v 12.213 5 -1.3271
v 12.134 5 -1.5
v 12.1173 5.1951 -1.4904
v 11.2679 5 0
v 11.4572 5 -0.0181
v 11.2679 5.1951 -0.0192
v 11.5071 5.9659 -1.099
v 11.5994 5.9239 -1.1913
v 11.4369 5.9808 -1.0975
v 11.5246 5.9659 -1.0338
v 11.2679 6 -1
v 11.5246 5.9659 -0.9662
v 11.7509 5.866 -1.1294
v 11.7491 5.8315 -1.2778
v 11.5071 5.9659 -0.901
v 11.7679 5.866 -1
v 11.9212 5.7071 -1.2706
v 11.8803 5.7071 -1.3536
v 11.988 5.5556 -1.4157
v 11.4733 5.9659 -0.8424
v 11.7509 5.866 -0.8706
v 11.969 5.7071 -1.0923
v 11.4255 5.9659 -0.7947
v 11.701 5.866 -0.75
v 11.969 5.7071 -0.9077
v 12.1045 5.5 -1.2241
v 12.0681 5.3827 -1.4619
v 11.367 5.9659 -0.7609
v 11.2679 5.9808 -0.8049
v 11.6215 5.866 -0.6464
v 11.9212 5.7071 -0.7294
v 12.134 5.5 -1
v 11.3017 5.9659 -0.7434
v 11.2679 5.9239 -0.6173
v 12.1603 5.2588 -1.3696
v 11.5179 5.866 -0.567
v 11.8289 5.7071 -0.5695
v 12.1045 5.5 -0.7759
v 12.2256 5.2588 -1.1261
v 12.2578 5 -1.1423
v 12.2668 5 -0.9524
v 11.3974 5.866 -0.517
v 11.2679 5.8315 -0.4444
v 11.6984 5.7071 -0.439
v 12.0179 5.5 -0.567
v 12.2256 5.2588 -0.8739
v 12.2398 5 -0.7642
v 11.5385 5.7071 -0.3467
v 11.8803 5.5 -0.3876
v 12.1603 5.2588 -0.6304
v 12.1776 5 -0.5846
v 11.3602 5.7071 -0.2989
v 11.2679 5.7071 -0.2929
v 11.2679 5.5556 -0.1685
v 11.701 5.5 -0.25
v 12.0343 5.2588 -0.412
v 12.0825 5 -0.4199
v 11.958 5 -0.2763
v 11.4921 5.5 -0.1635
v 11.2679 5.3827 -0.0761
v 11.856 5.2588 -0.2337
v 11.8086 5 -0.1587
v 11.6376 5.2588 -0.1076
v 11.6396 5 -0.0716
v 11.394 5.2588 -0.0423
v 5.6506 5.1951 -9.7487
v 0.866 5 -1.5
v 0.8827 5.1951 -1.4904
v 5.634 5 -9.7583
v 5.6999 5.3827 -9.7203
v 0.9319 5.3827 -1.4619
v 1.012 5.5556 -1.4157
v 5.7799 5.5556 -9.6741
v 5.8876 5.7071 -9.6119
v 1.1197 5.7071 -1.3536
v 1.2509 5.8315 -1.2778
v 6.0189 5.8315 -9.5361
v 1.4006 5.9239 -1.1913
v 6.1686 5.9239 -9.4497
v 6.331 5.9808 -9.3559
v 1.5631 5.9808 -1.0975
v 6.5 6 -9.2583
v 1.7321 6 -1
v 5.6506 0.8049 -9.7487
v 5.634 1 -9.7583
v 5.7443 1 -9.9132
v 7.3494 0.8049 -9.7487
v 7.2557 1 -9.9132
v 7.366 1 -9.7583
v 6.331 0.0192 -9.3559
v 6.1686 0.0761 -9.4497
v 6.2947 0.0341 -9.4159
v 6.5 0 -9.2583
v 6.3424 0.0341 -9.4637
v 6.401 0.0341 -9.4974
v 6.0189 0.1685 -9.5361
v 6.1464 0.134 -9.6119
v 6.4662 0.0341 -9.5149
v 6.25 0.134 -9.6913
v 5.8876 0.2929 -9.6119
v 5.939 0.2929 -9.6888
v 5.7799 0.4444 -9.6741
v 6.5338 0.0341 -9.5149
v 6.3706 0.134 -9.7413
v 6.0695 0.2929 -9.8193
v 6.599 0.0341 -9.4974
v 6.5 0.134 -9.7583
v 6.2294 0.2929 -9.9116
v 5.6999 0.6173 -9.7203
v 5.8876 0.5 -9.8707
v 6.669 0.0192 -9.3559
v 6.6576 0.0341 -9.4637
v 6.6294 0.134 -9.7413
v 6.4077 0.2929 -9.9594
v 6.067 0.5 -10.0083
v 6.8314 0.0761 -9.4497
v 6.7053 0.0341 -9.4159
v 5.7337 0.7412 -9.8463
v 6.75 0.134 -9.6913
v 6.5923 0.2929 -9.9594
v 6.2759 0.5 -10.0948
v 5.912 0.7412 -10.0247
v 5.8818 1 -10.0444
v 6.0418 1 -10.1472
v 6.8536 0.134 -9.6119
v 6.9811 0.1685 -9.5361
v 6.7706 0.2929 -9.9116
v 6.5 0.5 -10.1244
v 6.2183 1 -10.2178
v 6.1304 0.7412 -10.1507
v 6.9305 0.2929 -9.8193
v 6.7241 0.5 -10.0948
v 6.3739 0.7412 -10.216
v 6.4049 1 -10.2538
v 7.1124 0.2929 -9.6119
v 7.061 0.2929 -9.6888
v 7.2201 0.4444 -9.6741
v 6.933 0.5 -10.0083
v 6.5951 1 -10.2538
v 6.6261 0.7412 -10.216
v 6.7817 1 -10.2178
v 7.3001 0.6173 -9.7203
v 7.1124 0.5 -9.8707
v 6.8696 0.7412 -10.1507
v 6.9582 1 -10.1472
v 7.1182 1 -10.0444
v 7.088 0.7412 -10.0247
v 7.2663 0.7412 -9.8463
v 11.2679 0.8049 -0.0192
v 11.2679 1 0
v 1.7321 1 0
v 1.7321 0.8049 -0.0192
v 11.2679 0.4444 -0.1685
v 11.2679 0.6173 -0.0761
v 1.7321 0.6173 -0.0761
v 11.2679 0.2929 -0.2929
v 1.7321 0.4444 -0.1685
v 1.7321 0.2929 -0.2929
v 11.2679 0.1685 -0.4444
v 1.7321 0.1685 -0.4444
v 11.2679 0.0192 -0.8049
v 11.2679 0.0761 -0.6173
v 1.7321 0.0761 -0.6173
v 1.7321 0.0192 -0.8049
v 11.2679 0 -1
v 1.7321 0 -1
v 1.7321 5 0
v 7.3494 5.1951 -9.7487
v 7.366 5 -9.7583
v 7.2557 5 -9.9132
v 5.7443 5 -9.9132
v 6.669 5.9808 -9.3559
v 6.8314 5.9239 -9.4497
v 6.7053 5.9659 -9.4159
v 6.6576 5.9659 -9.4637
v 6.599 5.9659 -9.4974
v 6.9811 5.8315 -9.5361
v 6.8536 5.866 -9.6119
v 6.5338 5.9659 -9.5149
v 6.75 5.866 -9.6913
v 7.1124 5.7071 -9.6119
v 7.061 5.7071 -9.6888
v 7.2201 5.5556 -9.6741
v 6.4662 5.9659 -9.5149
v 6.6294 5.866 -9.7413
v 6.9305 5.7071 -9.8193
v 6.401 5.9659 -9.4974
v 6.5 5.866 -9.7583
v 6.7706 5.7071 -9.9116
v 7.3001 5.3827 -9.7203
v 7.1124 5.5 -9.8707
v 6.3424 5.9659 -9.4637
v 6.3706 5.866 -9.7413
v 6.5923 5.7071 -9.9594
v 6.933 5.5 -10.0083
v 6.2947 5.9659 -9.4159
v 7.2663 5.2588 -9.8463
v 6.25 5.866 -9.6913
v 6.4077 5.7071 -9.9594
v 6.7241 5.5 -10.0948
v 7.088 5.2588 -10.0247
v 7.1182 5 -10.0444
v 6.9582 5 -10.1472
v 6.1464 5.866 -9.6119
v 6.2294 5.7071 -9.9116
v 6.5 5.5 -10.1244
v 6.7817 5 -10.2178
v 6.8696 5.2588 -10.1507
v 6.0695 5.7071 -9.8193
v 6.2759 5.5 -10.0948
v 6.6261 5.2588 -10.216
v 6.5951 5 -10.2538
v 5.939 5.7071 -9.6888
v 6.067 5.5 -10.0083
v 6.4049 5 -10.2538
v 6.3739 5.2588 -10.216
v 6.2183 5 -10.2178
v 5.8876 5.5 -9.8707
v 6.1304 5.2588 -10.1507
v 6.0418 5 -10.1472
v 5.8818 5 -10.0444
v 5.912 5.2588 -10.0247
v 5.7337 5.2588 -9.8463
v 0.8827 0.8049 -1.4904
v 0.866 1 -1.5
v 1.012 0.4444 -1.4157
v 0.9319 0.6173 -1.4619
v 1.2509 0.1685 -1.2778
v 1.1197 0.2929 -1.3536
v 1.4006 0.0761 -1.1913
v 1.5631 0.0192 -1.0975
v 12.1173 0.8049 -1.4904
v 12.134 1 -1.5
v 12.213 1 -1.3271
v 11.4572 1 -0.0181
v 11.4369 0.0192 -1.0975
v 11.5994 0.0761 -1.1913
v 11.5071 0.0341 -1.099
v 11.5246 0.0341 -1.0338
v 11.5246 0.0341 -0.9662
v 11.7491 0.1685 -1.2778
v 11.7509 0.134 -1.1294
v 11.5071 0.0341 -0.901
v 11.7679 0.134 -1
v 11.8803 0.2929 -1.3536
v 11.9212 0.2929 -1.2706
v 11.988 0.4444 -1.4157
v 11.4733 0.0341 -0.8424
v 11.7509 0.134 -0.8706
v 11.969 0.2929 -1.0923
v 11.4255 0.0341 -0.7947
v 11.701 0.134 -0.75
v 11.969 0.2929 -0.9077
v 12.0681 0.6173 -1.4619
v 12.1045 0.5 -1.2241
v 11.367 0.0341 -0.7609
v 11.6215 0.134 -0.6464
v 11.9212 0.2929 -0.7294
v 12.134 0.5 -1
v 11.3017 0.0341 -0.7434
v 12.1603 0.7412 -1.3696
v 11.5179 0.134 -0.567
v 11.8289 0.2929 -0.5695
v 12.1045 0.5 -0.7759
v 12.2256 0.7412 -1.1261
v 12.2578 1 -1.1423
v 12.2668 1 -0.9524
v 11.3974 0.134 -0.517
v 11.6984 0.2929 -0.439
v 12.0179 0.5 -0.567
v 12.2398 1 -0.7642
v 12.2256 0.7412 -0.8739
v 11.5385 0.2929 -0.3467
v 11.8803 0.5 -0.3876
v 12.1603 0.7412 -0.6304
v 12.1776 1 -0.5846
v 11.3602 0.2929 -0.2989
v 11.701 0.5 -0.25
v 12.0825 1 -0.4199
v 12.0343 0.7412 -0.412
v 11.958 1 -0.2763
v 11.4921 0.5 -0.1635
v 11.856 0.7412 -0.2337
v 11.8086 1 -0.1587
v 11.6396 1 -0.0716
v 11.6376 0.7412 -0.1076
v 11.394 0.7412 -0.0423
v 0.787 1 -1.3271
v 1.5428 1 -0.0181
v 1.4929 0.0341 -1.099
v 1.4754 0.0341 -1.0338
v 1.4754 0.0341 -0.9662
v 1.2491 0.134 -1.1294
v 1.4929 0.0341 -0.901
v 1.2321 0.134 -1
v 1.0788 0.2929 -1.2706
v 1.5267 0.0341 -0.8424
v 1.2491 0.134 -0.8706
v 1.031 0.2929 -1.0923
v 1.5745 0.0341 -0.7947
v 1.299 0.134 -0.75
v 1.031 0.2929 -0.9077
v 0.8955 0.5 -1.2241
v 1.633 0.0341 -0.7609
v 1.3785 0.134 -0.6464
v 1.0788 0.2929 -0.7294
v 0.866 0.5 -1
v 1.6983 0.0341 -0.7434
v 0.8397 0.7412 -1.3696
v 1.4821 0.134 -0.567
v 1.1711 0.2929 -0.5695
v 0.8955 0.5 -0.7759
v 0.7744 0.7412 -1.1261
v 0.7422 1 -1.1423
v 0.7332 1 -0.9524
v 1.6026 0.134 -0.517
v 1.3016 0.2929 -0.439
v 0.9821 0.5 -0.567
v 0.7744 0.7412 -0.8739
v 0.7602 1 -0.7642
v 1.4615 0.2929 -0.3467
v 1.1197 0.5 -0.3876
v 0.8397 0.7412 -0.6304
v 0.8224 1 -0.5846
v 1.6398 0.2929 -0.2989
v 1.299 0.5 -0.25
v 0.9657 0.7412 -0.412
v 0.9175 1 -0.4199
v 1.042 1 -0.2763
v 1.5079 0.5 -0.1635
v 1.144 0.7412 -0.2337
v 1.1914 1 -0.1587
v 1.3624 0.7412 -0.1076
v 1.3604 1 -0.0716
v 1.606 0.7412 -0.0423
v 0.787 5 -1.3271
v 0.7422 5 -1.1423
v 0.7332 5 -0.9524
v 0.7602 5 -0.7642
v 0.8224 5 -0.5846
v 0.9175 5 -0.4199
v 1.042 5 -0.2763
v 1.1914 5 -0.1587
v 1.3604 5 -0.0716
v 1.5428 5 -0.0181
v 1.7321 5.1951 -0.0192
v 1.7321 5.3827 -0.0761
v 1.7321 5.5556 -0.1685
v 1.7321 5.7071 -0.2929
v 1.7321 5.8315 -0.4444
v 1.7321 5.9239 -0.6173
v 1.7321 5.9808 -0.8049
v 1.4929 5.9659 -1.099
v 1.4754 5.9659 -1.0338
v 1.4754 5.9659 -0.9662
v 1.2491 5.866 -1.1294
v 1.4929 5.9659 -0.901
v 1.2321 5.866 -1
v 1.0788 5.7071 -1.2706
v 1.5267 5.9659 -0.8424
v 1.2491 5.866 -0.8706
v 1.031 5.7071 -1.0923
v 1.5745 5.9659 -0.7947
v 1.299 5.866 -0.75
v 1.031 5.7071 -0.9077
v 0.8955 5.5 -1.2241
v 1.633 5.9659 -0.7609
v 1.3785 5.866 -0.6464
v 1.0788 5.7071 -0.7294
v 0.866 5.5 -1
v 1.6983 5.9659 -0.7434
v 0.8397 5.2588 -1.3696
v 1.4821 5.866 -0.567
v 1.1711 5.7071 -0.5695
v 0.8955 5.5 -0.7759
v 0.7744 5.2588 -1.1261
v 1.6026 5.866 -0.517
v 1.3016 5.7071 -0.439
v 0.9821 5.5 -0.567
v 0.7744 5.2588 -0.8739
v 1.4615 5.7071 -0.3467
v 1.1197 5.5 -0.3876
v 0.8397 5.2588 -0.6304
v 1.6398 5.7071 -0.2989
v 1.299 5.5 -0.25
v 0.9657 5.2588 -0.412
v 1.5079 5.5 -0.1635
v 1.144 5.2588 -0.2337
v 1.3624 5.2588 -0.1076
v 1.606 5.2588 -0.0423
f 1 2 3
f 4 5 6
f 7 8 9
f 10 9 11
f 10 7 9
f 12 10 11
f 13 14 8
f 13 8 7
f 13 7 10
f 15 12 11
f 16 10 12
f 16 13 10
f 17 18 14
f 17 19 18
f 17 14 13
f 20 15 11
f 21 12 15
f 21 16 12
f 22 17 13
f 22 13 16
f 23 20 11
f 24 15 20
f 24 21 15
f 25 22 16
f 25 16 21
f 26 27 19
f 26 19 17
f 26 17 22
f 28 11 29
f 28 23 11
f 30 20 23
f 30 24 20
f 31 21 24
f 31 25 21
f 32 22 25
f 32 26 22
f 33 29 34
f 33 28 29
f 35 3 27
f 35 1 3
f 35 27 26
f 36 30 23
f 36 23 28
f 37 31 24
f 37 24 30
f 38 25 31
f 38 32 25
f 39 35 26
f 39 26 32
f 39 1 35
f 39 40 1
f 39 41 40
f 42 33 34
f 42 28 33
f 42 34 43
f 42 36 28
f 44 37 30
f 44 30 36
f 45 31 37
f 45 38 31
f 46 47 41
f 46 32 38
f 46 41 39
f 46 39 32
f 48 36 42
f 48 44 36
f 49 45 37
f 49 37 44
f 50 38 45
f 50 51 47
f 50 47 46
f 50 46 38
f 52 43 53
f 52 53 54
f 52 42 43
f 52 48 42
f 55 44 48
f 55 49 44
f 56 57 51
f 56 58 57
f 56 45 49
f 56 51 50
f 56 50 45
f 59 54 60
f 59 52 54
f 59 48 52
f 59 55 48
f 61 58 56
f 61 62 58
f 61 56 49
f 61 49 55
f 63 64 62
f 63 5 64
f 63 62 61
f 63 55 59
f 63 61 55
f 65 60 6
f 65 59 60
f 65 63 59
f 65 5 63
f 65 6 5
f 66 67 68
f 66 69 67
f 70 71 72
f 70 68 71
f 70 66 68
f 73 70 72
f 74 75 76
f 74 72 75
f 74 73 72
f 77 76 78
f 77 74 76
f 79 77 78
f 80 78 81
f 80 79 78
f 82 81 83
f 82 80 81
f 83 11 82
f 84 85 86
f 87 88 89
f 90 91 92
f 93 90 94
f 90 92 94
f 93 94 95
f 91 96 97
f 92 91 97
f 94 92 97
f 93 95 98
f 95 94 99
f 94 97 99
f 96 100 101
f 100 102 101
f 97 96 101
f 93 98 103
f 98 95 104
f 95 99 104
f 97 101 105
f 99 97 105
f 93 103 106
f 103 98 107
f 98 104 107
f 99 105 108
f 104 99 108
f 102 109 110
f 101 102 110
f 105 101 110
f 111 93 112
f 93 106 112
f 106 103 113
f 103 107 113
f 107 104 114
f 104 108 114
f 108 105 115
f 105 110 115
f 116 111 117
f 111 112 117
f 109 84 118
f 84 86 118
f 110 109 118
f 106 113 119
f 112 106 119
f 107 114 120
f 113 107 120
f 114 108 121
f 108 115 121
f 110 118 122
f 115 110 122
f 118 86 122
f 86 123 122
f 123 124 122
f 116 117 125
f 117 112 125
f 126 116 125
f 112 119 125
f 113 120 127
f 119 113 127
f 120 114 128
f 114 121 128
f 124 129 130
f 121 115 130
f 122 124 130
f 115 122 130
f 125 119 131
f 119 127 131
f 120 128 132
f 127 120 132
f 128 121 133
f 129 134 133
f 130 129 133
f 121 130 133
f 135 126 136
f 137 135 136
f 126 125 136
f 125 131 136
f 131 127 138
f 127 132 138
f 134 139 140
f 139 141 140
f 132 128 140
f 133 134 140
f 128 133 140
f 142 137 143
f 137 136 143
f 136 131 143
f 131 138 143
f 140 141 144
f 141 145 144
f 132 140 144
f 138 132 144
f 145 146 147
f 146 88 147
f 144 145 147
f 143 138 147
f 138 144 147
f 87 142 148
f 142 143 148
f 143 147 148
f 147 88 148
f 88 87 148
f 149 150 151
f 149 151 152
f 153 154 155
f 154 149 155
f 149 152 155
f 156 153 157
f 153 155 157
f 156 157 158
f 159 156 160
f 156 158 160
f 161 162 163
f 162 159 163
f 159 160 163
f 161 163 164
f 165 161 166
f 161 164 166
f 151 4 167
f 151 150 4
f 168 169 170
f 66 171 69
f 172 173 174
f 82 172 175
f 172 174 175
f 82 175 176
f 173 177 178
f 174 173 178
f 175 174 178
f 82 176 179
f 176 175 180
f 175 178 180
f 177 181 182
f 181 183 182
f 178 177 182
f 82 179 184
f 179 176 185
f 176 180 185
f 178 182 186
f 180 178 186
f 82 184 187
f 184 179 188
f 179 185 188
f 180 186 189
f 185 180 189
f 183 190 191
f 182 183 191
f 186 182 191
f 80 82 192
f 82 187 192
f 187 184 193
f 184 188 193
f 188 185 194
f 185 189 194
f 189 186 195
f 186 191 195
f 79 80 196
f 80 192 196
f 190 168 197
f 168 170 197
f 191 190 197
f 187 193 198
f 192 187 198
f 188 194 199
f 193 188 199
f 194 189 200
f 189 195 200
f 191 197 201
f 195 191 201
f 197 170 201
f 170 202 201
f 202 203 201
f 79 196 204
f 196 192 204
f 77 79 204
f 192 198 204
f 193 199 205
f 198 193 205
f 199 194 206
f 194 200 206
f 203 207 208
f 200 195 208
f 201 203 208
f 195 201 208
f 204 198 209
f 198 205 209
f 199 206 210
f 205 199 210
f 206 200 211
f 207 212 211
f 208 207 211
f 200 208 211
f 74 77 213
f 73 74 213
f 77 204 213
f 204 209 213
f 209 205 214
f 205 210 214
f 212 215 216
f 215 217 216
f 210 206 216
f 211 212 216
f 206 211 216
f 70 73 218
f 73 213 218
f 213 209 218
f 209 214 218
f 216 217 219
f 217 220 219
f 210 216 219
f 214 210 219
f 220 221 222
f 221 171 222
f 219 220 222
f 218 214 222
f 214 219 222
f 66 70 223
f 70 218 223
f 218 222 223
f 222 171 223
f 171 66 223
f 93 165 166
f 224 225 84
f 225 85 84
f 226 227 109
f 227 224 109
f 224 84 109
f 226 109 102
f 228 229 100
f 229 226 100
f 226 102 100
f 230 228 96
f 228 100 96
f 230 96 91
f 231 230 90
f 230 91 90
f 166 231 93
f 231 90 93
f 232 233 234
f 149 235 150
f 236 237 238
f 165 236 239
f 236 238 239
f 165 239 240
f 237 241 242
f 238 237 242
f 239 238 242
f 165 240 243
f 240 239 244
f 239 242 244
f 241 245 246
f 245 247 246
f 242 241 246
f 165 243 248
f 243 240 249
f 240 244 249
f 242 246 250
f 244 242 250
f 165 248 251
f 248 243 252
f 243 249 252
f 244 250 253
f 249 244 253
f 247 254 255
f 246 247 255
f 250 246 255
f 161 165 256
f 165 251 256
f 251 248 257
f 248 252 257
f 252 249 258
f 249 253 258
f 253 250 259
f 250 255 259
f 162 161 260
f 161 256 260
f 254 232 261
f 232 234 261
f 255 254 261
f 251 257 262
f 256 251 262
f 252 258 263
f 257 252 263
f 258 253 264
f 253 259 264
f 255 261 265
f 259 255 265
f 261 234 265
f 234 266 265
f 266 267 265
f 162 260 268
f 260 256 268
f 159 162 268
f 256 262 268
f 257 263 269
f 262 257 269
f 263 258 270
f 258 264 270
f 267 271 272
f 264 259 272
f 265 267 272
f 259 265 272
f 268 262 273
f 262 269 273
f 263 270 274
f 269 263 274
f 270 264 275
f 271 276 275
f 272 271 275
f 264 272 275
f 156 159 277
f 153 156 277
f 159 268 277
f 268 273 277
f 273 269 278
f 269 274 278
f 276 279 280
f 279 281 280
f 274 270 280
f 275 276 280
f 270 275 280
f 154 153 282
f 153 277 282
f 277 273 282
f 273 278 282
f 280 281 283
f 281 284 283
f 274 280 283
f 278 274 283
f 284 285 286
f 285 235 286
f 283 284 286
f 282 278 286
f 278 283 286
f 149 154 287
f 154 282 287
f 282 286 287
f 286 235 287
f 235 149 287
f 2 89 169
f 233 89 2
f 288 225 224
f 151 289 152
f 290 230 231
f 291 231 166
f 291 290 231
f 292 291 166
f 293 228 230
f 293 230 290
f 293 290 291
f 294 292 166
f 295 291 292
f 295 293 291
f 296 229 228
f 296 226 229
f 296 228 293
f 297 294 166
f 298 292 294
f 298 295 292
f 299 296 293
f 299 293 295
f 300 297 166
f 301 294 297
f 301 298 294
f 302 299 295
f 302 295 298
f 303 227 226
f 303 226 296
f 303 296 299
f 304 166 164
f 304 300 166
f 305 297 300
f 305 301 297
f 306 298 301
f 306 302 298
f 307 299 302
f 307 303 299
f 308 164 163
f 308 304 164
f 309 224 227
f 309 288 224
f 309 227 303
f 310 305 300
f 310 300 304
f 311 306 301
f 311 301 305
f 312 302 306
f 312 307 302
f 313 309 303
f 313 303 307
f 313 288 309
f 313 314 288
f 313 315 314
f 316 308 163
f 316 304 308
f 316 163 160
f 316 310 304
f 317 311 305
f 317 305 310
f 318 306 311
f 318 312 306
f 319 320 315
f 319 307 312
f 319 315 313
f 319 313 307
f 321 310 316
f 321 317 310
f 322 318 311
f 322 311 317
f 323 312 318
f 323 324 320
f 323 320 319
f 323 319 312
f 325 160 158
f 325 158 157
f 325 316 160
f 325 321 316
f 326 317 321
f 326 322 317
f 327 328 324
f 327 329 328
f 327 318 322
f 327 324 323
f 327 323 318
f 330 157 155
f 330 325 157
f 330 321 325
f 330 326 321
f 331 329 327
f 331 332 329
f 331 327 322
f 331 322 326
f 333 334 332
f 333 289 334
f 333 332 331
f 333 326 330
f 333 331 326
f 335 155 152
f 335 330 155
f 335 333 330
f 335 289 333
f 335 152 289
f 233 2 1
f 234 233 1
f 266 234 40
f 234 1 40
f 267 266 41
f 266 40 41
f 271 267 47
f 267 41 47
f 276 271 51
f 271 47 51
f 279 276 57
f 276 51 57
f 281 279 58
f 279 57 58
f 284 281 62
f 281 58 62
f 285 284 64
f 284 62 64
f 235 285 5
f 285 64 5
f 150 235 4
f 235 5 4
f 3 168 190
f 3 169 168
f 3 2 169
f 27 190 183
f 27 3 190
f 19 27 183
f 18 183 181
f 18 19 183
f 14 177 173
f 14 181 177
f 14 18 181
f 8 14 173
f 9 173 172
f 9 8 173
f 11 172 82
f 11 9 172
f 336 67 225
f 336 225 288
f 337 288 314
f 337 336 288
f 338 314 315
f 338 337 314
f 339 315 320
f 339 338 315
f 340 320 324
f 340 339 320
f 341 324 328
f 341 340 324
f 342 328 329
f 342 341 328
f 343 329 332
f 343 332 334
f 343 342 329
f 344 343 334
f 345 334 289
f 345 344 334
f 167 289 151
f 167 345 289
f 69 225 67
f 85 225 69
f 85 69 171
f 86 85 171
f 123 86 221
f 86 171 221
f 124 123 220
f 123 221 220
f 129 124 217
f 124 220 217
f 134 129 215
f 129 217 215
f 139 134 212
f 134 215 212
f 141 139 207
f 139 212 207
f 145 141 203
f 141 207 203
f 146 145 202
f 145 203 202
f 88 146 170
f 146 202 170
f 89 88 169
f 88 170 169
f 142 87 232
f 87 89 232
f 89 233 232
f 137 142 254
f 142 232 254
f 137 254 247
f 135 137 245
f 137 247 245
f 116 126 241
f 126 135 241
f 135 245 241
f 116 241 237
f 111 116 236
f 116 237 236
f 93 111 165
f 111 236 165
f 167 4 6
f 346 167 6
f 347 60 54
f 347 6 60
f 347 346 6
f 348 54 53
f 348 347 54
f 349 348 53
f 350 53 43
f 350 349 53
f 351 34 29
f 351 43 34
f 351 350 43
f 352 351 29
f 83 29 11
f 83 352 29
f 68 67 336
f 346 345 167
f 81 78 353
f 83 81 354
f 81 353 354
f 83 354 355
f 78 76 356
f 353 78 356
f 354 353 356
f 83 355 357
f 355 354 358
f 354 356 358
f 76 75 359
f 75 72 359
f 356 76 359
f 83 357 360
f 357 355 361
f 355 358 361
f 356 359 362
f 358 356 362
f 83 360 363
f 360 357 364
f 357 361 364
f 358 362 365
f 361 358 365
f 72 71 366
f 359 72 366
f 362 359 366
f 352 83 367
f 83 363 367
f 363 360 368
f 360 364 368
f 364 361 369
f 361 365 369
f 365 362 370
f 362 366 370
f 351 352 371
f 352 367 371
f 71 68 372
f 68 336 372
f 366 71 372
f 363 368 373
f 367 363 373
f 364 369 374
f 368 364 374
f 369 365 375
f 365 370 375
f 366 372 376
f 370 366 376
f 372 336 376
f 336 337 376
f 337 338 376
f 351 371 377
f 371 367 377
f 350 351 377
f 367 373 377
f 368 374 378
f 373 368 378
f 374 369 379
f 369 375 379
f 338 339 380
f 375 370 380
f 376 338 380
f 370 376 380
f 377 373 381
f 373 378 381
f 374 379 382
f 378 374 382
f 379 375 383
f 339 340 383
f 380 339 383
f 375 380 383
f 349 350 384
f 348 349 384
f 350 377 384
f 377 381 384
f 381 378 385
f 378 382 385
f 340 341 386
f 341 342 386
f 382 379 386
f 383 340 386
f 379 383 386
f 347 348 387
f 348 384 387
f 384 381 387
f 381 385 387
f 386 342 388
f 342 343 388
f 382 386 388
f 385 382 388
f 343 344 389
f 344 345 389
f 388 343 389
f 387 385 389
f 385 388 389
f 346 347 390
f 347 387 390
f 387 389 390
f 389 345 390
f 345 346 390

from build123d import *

# Parameters (mm, degrees)
BOSS_EXTRUDE1_DEPTH = 6
FILLET1_R           = 1


with BuildPart() as part:
    # Sketch1 → Boss-Extrude1 (new body)
    with BuildSketch(Plane(origin=(0, 0, 0), x_dir=(1, 0, 0), z_dir=(0, 1, 0))):
        Polygon((0, 0), (6.5, 11.258330249), (13, 0), align=None)
    extrude(amount=BOSS_EXTRUDE1_DEPTH)

    # Fillet1
    fillet1_edges = [part.edges().sort_by_distance(p)[0] for p in [
        (3.25, 6, -5.629165125),
        (3.25, 0, -5.629165125),
        (6.5, 6, 0),
        (9.75, 0, -5.629165125),
        (6.5, 0, 0),
        (0, 3, 0),
        (6.5, 3, -11.258330249),
        (13, 3, 0),
        (9.75, 6, -5.629165125),
    ]]
    fillet(fillet1_edges, radius=FILLET1_R)


solid = part.part
